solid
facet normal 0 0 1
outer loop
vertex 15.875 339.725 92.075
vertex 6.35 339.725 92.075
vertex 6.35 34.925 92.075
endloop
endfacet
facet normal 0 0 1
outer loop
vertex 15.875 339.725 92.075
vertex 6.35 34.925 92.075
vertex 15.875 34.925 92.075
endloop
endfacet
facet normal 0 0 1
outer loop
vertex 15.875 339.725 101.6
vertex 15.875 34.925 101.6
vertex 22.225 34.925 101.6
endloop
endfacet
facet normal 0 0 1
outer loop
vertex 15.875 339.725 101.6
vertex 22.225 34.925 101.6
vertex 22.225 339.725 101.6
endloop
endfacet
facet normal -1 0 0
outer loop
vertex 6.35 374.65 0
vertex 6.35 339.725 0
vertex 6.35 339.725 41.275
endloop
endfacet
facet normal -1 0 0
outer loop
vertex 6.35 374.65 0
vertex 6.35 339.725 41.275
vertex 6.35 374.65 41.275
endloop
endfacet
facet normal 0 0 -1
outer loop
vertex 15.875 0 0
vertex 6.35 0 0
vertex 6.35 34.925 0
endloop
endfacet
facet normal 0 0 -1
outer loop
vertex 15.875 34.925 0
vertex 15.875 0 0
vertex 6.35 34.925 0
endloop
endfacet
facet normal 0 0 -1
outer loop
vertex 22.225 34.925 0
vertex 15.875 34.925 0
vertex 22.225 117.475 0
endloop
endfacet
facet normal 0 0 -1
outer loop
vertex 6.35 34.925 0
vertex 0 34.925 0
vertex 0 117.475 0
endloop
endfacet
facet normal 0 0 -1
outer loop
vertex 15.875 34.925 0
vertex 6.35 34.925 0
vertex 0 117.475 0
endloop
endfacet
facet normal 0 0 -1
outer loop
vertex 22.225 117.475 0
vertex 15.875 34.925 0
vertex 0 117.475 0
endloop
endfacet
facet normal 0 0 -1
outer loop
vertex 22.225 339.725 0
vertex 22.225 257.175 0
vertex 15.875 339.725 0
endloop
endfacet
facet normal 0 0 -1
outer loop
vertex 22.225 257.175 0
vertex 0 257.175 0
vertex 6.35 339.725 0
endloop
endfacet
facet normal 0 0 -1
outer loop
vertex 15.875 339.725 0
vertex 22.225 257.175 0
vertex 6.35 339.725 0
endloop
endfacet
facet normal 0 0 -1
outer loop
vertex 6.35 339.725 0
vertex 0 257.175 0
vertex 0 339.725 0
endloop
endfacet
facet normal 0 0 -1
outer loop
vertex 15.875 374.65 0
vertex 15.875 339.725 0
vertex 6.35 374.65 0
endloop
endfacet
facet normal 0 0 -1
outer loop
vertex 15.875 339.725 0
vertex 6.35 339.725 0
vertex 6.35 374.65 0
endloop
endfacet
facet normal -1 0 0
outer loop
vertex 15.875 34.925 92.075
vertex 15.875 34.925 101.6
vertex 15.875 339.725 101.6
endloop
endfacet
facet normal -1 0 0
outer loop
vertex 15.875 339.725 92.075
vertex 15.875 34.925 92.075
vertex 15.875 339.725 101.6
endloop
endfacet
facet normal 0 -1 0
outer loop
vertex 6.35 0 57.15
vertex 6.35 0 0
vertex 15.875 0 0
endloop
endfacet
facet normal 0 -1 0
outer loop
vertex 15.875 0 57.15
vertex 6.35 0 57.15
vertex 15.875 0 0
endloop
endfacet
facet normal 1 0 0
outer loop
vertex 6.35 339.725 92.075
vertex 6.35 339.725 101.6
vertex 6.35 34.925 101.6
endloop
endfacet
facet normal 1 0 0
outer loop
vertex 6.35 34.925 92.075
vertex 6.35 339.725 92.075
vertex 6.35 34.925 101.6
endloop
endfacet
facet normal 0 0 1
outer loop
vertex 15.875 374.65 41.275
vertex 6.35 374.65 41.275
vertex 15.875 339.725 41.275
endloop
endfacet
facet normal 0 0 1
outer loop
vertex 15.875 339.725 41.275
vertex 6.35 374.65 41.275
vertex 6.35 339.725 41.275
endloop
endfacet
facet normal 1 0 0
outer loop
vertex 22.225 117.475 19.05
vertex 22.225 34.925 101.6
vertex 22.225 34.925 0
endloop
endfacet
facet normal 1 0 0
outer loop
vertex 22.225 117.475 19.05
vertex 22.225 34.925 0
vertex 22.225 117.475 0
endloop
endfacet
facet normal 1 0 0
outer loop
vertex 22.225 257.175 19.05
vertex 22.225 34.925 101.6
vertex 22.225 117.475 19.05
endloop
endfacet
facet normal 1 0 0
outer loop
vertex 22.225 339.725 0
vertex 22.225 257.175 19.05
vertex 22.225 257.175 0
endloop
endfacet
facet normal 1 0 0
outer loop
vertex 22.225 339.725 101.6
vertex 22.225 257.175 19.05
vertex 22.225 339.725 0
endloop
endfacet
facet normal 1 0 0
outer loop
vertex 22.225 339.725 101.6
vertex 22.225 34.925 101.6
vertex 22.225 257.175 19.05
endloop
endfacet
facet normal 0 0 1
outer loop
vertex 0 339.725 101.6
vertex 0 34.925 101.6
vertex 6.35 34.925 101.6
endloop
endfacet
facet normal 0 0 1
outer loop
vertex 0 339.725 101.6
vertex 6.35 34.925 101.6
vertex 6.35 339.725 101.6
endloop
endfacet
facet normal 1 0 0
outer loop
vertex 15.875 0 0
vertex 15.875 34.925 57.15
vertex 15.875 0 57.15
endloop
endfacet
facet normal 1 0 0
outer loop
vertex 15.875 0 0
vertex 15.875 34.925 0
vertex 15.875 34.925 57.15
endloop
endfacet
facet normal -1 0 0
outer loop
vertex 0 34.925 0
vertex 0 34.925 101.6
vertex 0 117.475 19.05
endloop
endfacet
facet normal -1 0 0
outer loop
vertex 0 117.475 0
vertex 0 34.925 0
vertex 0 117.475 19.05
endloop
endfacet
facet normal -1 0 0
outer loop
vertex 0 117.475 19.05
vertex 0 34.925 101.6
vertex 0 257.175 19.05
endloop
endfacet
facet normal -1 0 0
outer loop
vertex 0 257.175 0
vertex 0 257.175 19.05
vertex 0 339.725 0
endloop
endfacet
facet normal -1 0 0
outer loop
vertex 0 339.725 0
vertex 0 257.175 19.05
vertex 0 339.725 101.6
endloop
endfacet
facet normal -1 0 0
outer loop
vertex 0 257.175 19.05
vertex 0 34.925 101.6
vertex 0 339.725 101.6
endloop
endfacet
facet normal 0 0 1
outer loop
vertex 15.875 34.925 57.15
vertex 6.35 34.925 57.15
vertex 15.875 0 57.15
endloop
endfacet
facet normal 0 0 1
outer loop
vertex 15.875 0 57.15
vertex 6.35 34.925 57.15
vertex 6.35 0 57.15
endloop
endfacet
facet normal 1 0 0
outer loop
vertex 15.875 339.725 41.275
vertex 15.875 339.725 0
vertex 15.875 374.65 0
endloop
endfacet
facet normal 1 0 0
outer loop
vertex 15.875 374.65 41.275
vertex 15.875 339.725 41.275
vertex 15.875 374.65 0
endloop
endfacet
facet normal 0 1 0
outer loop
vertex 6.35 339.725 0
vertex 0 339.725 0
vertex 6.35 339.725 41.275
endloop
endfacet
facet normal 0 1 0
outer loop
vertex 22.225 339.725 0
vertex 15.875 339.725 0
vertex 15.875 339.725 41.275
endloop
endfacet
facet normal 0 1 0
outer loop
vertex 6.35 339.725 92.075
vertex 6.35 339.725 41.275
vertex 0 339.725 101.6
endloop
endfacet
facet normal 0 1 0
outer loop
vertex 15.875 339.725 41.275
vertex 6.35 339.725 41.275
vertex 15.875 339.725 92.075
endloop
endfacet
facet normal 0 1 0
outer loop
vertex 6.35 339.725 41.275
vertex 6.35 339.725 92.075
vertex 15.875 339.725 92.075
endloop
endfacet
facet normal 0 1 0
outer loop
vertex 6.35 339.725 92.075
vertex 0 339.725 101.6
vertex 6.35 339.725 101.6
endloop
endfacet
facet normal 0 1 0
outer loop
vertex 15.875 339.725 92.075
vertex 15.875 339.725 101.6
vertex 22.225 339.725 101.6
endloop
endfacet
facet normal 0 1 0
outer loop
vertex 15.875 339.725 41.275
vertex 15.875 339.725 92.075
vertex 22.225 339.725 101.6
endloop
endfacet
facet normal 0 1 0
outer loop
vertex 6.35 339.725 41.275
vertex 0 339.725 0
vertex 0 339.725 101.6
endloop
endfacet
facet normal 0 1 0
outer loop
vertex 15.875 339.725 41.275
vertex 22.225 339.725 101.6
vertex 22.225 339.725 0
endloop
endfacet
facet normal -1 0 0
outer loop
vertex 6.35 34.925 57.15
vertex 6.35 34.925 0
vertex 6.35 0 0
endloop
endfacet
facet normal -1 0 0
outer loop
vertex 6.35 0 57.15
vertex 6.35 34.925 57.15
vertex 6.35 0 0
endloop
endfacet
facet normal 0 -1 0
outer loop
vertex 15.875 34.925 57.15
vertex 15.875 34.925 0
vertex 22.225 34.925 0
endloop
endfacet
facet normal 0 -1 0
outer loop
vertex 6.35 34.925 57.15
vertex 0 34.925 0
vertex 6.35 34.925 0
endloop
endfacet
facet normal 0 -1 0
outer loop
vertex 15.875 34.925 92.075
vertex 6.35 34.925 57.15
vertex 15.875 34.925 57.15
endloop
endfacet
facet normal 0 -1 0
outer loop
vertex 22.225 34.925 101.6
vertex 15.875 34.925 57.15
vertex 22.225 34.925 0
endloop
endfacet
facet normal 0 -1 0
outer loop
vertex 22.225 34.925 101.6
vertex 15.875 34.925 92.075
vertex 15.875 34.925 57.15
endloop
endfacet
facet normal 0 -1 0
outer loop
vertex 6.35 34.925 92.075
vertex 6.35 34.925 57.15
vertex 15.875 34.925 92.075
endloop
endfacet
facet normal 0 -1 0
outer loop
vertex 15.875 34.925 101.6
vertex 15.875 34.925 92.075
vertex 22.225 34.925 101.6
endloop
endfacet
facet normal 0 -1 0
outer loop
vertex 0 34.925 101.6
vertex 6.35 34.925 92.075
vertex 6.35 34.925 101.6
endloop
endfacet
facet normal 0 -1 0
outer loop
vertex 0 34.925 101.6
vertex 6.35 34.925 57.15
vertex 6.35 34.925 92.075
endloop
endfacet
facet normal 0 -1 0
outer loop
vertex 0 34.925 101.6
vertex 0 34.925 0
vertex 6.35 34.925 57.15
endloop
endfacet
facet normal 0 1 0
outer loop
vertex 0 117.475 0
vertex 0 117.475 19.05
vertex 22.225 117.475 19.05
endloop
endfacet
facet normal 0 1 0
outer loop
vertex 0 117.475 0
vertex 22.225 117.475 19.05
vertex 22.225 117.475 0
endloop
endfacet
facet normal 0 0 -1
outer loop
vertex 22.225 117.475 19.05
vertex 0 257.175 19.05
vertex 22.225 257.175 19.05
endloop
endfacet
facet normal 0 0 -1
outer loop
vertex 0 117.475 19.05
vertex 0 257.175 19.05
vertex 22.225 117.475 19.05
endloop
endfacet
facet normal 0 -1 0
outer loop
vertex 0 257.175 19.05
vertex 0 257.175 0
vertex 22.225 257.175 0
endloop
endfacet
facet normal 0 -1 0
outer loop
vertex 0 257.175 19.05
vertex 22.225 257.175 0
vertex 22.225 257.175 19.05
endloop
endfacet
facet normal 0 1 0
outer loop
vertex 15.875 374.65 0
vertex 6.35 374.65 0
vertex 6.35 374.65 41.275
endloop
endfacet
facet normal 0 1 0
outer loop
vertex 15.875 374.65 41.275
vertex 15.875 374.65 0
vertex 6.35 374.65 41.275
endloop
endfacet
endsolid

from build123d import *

# Parameters (mm, degrees)
F0_W     = 374.65
F0_H     = 101.6
F1_DEPTH = 22.225
F2_W     = 9.525
F2_H     = 34.925
F2_H_2   = 304.8
F3_DEPTH = 9.525
F2_W_2   = 6.35
F4_DEPTH = 101.6
F5_W     = 34.925
F5_H     = 50.8
F6_DEPTH = 9.525
F8_DEPTH = 22.225
F9_DEPTH = 15.875


with BuildPart() as f1:
    # F0 (on Right) → F1 (new body)
    with BuildSketch(Plane.YZ):
        with Locations((187.325, 50.8)):
            Rectangle(F0_W, F0_H)
    extrude(amount=F1_DEPTH)

    # F2 (on face) → F3 (cut)
    with BuildSketch(Plane.XY.offset(101.6)):
        with Locations((11.1125, 357.1875)):
            Rectangle(F2_W, F2_H)
        with Locations((11.1125, 187.325)):
            Rectangle(F2_W, F2_H_2)
        with Locations((11.1125, 17.4625)):
            Rectangle(F2_W, F2_H)
    extrude(amount=-F3_DEPTH, mode=Mode.SUBTRACT)

    # F2 (on face) → F4 (cut, through all)
    with BuildSketch(Plane.XY.offset(101.6)):
        with Locations((19.05, 357.1875)):
            Rectangle(F2_W_2, F2_H)
        with Locations((3.175, 357.1875)):
            Rectangle(F2_W_2, F2_H)
        with Locations((3.175, 17.4625)):
            Rectangle(F2_W_2, F2_H)
        with Locations((19.05, 17.4625)):
            Rectangle(F2_W_2, F2_H)
    extrude(amount=-F4_DEPTH, mode=Mode.SUBTRACT)

    # F5 (on face) → F6 (cut, through all)
    with BuildSketch(Plane(origin=(6.35, 0, 0), x_dir=(0, -1, 0), z_dir=(-1, 0, 0))):
        with Locations((-357.1875, 66.675)):
            Rectangle(F5_W, F5_H)
        with Locations((-17.4625, 66.675)):
            Rectangle(F5_W, F5_H)
    extrude(amount=-F6_DEPTH, mode=Mode.SUBTRACT)

    # F7 (on Right) → F8 (cut, through all)
    with BuildSketch(Plane.YZ):
        Polygon((257.175, 0), (257.175, 19.05), (212.725, 19.05), (161.925, 19.05), (117.475, 19.05), (117.475, 0), align=None)
    extrude(amount=F8_DEPTH, mode=Mode.SUBTRACT)

    # F9 (add): a face of the model
    f9_faces = [f1.faces().sort_by_distance(p)[0] for p in [
        (11.1125, 17.4625, 41.275),
    ]]
    extrude(f9_faces, amount=F9_DEPTH)


solid = f1.part
